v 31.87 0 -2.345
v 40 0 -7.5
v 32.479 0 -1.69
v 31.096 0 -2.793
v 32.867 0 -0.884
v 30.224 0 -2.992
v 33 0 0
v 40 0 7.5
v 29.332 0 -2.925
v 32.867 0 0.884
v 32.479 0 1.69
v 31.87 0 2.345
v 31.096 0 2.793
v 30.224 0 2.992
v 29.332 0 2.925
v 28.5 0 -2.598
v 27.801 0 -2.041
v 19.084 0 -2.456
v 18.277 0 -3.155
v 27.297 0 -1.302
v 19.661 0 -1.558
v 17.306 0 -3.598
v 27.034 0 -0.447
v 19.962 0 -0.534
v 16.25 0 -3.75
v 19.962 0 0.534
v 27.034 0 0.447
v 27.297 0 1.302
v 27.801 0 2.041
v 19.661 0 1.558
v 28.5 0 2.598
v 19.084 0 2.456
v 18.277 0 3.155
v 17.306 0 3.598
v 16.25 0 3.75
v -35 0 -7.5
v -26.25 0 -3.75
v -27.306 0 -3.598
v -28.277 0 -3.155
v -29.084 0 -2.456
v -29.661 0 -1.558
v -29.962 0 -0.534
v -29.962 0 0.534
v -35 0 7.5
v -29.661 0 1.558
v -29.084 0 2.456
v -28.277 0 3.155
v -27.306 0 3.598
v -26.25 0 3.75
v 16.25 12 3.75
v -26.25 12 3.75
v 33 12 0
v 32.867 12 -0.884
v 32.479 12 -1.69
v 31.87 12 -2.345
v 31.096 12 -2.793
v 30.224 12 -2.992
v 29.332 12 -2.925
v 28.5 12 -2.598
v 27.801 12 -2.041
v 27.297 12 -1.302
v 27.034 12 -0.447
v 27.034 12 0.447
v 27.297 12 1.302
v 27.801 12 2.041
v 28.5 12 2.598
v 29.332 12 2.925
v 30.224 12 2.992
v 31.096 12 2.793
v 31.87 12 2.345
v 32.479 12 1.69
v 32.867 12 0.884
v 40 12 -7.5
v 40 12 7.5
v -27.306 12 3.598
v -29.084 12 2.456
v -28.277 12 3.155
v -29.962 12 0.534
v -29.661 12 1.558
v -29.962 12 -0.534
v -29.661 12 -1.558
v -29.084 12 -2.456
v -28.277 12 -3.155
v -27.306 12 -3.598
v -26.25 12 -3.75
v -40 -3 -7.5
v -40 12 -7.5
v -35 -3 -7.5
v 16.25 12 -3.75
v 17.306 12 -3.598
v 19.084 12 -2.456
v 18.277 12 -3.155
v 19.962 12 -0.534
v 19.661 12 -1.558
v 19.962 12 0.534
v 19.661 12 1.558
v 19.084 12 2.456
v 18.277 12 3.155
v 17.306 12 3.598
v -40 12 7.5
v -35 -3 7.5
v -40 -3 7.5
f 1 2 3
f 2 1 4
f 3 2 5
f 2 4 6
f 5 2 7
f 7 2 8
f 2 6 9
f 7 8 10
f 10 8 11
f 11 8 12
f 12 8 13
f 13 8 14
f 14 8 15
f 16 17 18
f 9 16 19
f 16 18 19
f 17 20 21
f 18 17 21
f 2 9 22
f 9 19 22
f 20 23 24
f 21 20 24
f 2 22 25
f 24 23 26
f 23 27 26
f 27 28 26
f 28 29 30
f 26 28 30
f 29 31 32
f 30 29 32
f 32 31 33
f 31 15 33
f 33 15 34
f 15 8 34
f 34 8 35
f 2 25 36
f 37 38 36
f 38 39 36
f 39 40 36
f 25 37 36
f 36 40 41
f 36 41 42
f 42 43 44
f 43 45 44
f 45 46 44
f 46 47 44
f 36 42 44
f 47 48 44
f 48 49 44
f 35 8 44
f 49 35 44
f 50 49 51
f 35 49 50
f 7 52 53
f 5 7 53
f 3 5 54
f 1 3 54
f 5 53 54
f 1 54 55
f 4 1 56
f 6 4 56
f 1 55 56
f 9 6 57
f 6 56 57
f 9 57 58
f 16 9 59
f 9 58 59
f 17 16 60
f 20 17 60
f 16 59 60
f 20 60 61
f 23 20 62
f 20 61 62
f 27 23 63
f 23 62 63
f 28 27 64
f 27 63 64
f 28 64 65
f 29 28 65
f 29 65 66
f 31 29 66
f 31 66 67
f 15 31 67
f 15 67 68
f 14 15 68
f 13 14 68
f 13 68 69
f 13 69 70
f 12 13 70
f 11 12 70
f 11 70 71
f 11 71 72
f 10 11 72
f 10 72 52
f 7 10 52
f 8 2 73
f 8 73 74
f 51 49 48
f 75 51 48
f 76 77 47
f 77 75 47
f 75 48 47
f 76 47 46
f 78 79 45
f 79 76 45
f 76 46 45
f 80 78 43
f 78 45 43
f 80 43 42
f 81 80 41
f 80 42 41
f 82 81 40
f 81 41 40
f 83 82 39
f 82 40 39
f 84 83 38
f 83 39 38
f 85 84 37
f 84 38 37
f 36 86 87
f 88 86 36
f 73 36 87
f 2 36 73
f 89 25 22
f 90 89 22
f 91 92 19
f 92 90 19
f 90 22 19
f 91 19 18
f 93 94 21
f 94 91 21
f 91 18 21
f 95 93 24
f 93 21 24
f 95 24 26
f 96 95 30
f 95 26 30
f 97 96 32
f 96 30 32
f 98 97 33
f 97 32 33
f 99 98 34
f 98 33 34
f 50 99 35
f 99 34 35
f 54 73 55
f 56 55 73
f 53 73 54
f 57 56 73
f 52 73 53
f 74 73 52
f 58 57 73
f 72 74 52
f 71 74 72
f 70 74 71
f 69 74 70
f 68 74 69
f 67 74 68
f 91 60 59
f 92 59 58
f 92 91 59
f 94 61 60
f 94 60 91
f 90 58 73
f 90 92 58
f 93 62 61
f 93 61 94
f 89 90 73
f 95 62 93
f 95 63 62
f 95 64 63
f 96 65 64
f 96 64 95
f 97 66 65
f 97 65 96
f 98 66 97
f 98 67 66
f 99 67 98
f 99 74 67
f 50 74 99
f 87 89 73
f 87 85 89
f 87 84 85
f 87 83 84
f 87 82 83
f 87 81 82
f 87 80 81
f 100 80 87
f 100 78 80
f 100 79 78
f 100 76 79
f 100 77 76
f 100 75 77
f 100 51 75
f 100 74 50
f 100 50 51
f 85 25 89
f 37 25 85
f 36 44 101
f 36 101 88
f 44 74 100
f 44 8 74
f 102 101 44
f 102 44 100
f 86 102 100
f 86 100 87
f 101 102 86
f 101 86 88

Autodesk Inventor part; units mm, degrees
ref_plane "YZ Plane" through (0, 0, 0) normal (1, 0, 0) x (0, 1, 0)
ref_plane "XZ Plane" through (0, 0, 0) normal (0, 1, 0) x (-1, 0, 0)
ref_plane "XY Plane" through (0, 0, 0) normal (0, 0, 1) x (1, 0, 0)
sketch "Sketch1" plane through (0, 0, 0) normal (0, 1, 0) x (-1, 0, 0)
  line L0 (-40, 7.5) -> (40, 7.5)
  line L1 (40, 7.5) -> (40, -7.5)
  line L2 (40, -7.5) -> (-40, -7.5)
  line L3 (-40, -7.5) -> (-40, 7.5)
  line L4 (-40, 7.5) -> (40, -7.5) construction
  line L5 (40, 7.5) -> (-40, -7.5) construction
  line L6 (30, 0) -> (-20, 0) construction
  line L7 (26.25, 3.75) -> (-16.25, 3.75)
  line L8 (-16.25, -3.75) -> (26.25, -3.75)
  arc A0 (26.25, -3.75) -> (26.25, 3.75) centre (26.25, 0) ccw
  arc A1 (-16.25, 3.75) -> (-16.25, -3.75) centre (-16.25, 0) ccw
  point P0 (0, 0)
  point P1 (5, 0)
  dimension "d0" = 15
  dimension "d1" = 80
  dimension "d2" = 7.5
  dimension "d3" = 50
  dimension "d4" = 10
extrude "Extrusion1" add sketch "Sketch1" along normal blind 12
sketch "Sketch2" plane through (0, 0, 0) normal (0, -1, 0) x (1, 0, 0)
  line L0 (-40, 7.5) -> (-35, 7.5)
  line L1 (-35, 7.5) -> (-35, -7.5)
  line L2 (-35, -7.5) -> (-40, -7.5)
  line L3 (-40, -7.5) -> (-40, 7.5)
  point P0 (0, 0)
  dimension "d7" = 5
extrude "Extrusion2" add sketch "Sketch2" along normal blind 3
sketch "Sketch3" plane through (0, 12, 0) normal (0, 1, 0) x (1, 0, 0)
  circle A0 centre (30, 0) radius 3
  line L0 (40, -7.5) -> (40, 7.5) projected
  point P0 (0, 0)
  dimension "d19" = 6
  dimension "d20" = 10
extrude "Extrusion3" cut sketch "Sketch3" against normal up to next
thread "Thread1" size "M6x1" class "6H" standard "ANSI Metric M Profile" full length
properties part number "LabClamp"
